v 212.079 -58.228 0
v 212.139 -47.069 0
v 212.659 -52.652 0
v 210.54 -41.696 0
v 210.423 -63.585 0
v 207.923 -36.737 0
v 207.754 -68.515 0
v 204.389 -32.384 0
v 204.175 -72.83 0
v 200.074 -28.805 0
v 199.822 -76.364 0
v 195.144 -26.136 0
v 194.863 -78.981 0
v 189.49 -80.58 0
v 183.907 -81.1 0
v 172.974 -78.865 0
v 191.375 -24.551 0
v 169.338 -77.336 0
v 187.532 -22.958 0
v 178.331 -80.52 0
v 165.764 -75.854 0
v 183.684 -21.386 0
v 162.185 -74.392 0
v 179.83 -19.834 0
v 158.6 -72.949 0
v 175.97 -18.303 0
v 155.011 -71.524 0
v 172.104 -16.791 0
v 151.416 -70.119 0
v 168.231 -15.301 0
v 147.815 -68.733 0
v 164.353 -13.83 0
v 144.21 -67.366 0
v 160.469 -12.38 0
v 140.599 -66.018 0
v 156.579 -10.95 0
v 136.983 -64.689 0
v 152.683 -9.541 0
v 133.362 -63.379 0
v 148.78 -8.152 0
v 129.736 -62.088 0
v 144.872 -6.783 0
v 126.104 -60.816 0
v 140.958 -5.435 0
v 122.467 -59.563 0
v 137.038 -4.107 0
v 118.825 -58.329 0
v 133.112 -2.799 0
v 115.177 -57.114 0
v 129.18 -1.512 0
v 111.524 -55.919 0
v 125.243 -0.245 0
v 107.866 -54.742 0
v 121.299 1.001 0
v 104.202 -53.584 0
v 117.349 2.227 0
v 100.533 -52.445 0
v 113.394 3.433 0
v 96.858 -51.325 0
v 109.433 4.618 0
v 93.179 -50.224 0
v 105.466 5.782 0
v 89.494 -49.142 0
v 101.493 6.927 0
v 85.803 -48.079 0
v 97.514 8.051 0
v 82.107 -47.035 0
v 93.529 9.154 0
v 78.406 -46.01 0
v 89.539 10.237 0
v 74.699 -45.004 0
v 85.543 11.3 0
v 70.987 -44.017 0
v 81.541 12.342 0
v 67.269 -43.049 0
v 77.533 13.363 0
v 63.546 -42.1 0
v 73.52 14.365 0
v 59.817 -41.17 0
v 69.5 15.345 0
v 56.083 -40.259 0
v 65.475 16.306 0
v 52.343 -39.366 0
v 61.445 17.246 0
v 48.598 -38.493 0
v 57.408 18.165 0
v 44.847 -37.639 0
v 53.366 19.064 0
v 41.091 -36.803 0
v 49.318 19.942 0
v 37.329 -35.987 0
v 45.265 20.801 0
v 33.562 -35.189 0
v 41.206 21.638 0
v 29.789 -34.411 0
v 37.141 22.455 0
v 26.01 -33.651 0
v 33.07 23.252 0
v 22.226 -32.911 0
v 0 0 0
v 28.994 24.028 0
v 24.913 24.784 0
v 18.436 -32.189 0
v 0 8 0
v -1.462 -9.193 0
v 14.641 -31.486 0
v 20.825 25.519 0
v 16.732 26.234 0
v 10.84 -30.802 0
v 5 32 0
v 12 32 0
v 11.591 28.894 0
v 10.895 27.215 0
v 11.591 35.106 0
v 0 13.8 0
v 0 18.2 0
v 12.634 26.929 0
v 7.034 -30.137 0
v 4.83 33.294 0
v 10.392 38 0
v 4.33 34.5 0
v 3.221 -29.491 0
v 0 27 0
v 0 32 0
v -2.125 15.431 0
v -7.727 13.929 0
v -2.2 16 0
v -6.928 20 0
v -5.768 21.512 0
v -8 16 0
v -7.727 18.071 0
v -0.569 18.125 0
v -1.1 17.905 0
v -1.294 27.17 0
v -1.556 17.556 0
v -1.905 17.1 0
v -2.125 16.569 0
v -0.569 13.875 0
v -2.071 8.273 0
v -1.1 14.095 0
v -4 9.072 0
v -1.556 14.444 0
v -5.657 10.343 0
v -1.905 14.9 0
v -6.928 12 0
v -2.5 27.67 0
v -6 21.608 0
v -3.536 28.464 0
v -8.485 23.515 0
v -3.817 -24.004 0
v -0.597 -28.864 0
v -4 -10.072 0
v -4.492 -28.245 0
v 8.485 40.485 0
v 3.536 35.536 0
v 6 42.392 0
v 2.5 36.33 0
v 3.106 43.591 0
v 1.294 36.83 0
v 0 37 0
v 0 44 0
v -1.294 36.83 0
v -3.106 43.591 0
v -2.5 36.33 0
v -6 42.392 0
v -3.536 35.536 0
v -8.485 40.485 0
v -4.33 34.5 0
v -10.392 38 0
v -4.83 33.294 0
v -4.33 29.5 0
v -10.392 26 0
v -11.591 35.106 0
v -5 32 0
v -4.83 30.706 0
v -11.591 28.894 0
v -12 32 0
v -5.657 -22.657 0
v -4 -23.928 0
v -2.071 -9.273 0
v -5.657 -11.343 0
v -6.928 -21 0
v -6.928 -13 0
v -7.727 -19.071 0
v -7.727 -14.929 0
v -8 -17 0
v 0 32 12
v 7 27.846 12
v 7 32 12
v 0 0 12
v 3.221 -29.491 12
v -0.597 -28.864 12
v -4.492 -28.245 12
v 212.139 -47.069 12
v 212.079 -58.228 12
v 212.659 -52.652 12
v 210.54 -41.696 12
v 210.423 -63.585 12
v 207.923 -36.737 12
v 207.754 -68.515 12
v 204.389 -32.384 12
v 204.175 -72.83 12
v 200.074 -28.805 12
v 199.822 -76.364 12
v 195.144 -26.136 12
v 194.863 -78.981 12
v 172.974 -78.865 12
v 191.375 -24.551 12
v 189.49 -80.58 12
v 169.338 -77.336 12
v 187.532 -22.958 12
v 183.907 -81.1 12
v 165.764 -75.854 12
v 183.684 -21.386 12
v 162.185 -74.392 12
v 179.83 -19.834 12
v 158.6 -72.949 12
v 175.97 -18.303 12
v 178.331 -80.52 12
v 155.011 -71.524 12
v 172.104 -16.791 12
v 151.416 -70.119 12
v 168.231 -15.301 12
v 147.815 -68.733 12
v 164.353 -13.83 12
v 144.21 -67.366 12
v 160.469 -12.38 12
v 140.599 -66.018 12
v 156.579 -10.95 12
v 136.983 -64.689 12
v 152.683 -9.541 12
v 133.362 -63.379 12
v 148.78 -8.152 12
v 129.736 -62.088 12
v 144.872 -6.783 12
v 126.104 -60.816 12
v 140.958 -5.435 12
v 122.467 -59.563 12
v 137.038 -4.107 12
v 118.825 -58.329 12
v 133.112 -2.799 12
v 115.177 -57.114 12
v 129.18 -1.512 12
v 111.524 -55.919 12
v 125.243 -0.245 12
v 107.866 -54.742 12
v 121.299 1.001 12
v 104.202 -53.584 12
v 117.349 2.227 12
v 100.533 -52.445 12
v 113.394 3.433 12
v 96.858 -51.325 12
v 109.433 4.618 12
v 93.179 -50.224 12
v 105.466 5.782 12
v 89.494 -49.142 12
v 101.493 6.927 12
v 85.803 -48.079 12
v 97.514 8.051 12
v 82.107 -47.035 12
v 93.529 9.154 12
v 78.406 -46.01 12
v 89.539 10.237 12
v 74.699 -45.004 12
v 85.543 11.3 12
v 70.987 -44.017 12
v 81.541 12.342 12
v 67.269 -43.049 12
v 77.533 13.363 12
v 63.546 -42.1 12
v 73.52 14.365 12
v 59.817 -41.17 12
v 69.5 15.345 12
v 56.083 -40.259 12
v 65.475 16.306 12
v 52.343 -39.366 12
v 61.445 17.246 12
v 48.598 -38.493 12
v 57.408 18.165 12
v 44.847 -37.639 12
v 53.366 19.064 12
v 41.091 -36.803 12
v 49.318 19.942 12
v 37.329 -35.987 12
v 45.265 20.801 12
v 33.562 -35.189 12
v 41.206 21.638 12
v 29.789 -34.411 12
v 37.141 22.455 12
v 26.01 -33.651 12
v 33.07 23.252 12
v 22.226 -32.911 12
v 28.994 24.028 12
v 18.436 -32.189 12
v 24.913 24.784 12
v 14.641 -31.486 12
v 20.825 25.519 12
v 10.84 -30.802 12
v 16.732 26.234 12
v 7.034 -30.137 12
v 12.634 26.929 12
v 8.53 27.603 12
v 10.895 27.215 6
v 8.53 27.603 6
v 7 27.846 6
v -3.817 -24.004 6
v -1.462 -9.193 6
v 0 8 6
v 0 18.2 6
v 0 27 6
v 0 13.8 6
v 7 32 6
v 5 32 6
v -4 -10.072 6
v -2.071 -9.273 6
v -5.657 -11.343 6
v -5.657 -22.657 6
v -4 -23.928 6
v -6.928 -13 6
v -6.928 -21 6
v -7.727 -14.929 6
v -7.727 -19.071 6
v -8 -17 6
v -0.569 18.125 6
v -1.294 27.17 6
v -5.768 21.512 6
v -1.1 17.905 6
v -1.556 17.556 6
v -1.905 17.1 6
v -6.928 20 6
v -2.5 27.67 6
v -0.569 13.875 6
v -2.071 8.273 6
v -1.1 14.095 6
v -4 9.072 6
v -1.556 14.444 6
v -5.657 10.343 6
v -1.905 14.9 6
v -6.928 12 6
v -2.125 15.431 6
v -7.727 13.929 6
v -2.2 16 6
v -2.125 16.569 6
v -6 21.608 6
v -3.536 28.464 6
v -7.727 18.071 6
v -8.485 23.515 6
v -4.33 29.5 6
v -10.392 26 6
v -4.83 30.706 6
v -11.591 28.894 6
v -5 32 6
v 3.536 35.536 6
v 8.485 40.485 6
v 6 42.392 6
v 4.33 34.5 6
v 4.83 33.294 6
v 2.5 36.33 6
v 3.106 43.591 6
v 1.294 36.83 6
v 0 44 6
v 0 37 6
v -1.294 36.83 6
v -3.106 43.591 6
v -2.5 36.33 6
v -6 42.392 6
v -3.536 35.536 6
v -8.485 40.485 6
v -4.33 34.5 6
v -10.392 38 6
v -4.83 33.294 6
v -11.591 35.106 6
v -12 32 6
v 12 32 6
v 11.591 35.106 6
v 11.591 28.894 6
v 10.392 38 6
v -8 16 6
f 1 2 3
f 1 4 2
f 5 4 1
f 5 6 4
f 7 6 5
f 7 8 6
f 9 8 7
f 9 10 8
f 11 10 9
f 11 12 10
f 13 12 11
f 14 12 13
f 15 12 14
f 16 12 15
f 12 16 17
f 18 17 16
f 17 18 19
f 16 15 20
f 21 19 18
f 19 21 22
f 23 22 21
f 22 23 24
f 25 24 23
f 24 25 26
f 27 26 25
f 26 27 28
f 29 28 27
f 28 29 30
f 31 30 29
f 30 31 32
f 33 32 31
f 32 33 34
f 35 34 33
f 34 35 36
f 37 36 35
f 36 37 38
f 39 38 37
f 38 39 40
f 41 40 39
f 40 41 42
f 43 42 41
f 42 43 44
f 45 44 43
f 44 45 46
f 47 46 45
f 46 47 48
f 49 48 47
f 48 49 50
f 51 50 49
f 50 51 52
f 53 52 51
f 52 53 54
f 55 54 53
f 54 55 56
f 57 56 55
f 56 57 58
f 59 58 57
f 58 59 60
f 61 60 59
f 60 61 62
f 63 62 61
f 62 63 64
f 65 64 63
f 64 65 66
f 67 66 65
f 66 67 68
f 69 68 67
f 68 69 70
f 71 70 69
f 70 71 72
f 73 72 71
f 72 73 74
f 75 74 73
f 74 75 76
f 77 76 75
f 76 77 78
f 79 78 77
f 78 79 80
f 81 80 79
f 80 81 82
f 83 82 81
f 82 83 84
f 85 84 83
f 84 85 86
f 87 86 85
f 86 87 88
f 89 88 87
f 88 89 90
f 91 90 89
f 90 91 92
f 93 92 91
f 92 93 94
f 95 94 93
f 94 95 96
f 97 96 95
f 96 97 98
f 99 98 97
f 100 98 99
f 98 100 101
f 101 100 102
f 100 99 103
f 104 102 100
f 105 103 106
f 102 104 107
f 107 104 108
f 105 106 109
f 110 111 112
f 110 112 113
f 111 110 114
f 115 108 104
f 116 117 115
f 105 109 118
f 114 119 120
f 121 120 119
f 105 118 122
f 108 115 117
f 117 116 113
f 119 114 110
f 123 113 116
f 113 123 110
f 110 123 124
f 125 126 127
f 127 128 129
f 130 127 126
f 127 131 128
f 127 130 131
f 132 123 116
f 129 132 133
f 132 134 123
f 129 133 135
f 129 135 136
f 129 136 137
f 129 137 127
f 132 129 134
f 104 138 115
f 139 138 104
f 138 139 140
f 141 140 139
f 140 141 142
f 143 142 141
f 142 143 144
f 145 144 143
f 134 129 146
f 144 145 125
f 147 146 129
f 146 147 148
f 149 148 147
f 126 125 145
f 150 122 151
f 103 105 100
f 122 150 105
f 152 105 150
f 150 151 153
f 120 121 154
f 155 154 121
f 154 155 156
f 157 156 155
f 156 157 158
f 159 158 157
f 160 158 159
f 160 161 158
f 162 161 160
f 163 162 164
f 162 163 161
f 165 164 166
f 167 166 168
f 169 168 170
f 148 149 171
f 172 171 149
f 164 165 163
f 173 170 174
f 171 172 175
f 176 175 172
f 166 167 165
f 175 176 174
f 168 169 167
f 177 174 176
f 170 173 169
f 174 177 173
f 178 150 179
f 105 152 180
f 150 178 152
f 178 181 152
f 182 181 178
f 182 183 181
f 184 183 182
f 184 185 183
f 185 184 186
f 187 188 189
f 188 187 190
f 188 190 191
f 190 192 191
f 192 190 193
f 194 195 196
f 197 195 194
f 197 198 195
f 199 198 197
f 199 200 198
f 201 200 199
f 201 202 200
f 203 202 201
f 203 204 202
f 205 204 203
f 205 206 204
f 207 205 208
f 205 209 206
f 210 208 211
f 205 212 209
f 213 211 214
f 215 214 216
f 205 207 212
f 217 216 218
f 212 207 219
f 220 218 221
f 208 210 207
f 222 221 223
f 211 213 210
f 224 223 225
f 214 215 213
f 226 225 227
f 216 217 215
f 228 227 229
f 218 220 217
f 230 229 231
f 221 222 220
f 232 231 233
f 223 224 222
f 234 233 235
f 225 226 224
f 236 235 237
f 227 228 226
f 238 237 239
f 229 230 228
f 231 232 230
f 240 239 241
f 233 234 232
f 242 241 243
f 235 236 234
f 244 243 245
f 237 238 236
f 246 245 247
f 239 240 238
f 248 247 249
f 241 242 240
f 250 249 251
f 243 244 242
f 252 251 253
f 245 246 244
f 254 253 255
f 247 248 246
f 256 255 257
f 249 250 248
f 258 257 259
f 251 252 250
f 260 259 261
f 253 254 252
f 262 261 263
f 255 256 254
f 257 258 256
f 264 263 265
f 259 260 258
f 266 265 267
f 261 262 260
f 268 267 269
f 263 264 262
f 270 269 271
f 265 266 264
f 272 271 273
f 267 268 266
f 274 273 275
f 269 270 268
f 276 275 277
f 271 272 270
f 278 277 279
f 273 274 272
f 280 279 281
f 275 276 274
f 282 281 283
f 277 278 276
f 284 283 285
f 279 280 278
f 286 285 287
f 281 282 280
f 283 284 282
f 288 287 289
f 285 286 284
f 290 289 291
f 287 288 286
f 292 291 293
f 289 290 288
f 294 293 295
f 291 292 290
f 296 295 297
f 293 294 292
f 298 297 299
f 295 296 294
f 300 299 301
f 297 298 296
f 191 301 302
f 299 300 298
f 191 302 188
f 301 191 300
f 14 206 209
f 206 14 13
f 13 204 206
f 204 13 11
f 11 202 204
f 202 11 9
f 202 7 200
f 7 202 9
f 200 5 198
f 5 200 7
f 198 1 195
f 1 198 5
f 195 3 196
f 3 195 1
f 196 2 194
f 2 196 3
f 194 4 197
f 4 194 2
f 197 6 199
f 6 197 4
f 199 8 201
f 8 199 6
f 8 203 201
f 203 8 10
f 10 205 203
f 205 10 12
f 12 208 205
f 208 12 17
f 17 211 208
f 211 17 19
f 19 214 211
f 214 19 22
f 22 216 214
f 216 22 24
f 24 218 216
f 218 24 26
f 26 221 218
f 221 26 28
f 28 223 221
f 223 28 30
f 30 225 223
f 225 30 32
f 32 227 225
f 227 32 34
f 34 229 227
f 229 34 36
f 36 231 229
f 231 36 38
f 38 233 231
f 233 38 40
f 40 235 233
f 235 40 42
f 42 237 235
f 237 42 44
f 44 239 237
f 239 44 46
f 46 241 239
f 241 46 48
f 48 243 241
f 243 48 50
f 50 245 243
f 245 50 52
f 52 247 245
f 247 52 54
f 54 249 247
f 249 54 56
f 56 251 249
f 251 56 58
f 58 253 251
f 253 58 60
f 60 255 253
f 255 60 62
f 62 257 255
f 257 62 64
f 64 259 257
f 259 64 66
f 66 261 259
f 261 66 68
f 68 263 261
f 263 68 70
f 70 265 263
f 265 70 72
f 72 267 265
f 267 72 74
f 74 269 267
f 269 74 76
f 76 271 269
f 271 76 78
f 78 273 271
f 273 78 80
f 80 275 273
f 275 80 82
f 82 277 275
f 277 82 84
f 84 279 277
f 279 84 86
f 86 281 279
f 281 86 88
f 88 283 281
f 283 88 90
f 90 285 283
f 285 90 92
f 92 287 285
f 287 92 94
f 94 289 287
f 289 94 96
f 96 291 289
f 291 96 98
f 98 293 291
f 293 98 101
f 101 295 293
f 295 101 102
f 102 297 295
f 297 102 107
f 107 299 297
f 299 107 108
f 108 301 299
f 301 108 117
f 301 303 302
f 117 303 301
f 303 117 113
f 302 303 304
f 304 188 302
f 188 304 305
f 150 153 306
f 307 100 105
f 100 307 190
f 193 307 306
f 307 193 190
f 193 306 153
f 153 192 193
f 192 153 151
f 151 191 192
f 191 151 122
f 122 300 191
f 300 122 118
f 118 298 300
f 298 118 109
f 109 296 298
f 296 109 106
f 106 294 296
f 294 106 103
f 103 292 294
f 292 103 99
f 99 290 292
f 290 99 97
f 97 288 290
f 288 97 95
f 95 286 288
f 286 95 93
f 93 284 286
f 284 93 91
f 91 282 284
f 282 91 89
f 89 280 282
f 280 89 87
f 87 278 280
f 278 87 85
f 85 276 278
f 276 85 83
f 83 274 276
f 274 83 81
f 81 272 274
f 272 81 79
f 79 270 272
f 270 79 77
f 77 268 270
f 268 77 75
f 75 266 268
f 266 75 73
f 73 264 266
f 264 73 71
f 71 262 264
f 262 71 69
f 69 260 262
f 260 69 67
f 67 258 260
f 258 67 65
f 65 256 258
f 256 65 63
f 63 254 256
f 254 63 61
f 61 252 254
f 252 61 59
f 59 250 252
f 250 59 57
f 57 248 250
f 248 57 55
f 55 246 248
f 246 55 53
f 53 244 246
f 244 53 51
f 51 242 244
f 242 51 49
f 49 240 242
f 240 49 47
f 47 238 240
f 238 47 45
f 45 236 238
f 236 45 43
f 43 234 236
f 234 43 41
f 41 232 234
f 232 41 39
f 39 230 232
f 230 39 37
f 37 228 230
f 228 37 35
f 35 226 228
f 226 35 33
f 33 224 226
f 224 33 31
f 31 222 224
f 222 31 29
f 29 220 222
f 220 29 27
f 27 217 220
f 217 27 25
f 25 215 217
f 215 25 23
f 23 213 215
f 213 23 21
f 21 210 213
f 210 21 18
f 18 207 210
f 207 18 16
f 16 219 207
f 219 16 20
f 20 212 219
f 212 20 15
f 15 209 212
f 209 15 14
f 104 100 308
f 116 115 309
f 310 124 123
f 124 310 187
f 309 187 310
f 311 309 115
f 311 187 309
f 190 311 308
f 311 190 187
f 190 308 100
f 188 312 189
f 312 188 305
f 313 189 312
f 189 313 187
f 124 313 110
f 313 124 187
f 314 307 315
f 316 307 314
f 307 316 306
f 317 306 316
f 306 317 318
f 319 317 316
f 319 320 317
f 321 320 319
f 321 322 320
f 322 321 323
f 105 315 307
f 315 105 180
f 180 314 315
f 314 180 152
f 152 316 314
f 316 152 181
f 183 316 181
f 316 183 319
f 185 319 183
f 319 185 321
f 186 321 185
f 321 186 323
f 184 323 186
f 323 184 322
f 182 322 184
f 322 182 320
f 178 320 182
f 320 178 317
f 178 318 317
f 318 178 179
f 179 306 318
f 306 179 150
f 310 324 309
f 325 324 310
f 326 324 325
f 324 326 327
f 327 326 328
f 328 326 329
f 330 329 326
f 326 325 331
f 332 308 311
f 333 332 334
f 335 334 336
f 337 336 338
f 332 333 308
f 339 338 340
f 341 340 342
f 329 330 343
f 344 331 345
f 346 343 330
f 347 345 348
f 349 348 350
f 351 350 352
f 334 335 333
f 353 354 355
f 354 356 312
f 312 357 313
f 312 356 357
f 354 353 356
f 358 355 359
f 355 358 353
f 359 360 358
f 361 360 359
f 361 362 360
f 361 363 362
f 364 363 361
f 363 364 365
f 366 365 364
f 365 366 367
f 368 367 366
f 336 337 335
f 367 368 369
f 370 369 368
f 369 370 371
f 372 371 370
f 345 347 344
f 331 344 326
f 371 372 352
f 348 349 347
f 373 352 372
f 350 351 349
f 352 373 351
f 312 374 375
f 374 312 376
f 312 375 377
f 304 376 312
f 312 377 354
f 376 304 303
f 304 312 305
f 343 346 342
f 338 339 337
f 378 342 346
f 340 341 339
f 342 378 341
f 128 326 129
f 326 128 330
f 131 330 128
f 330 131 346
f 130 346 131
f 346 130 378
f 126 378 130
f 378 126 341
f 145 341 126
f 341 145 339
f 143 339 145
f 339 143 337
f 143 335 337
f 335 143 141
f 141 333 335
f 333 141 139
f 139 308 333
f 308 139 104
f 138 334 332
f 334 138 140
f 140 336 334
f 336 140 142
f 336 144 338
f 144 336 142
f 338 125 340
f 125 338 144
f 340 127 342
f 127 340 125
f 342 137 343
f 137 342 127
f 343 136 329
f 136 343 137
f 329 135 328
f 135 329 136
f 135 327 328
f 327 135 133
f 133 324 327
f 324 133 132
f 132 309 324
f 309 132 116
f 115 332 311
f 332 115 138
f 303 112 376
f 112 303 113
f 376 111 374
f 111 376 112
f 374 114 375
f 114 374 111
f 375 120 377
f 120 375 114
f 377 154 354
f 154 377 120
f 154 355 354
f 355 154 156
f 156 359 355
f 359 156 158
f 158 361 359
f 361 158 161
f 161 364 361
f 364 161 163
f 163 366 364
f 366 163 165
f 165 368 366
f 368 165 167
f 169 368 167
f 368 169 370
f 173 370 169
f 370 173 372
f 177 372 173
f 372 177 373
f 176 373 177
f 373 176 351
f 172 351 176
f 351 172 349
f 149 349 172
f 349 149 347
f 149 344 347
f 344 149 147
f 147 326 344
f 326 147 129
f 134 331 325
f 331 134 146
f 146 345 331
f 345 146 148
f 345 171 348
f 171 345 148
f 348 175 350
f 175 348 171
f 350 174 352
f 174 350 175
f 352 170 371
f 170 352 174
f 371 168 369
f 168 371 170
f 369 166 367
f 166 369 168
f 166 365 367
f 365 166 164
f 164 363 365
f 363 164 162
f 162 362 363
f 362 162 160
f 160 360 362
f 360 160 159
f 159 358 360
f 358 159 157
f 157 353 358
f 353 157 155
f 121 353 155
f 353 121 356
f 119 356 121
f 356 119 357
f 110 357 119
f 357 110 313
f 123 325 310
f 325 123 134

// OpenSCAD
// hanger-split: half w22 w=22 cm slope=15.92 deg bow=0.59 cm r=2.86 cm depth=12.0 mm
// Print this half twice, flat. Turn the second half 180 degrees about the vertical axis, lay the
// bosses together and clamp with two M4 bolts through the 4.4 mm holes.
// Generated by hanger_split.split.scad; not rendered in this run (no OpenSCAD in the image).
depth = 12.0;
union() {
  linear_extrude(height = 12) polygon([[4.492, 28.245], [8.530, 27.603], [12.634, 26.929], [16.732, 26.234], [20.825, 25.519], [24.913, 24.784], [28.994, 24.028], [33.070, 23.252], [37.141, 22.455], [41.206, 21.638], [45.265, 20.801], [49.318, 19.942], [53.366, 19.064], [57.408, 18.165], [61.445, 17.246], [65.475, 16.306], [69.500, 15.345], [73.520, 14.365], [77.533, 13.363], [81.541, 12.342], [85.543, 11.300], [89.539, 10.237], [93.529, 9.154], [97.514, 8.051], [101.493, 6.927], [105.466, 5.782], [109.433, 4.618], [113.394, 3.433], [117.349, 2.227], [121.299, 1.001], [125.243, -0.245], [129.180, -1.512], [133.112, -2.799], [137.038, -4.107], [140.958, -5.435], [144.872, -6.783], [148.780, -8.152], [152.683, -9.541], [156.579, -10.950], [160.469, -12.380], [164.353, -13.830], [168.231, -15.301], [172.104, -16.791], [175.970, -18.303], [179.830, -19.834], [183.684, -21.386], [187.532, -22.958], [191.375, -24.551], [195.144, -26.136], [200.074, -28.805], [204.389, -32.384], [207.923, -36.737], [210.540, -41.696], [212.139, -47.069], [212.659, -52.652], [212.079, -58.228], [210.423, -63.585], [207.754, -68.515], [204.175, -72.830], [199.822, -76.364], [194.863, -78.981], [189.490, -80.580], [183.907, -81.100], [178.331, -80.520], [172.974, -78.865], [169.338, -77.336], [165.764, -75.854], [162.185, -74.392], [158.600, -72.949], [155.011, -71.524], [151.416, -70.119], [147.815, -68.733], [144.210, -67.366], [140.599, -66.018], [136.983, -64.689], [133.362, -63.379], [129.736, -62.088], [126.104, -60.816], [122.467, -59.563], [118.825, -58.329], [115.177, -57.114], [111.524, -55.919], [107.866, -54.742], [104.202, -53.584], [100.533, -52.445], [96.858, -51.325], [93.179, -50.224], [89.494, -49.142], [85.803, -48.079], [82.107, -47.035], [78.406, -46.010], [74.699, -45.004], [70.987, -44.017], [67.269, -43.049], [63.546, -42.100], [59.817, -41.170], [56.083, -40.259], [52.343, -39.366], [48.598, -38.493], [44.847, -37.639], [41.091, -36.803], [37.329, -35.987], [33.562, -35.189], [29.789, -34.411], [26.010, -33.651], [22.226, -32.911], [18.436, -32.189], [14.641, -31.486], [10.840, -30.802], [7.034, -30.137], [3.221, -29.491], [-0.597, -28.864], [-4.492, -28.245]]);
  linear_extrude(height = 12) polygon([[0.000, -28.600], [7.402, -27.625], [14.300, -24.768], [20.223, -20.223], [24.768, -14.300], [27.625, -7.402], [28.600, -0.000], [27.625, 7.402], [24.768, 14.300], [20.223, 20.223], [14.300, 24.768], [7.402, 27.625], [0.000, 28.600]]);
  linear_extrude(height = 12) polygon([[0.000, 0.000], [7.000, 0.000], [7.000, 32.000], [0.000, 32.000]]);
  linear_extrude(height = 6) difference() { polygon([[8.000, -17.000], [7.727, -14.929], [6.928, -13.000], [5.657, -11.343], [4.000, -10.072], [2.071, -9.273], [0.000, -9.000], [-2.071, -9.273], [-4.000, -10.072], [-5.657, -11.343], [-6.928, -13.000], [-7.727, -14.929], [-8.000, -17.000], [-7.727, -19.071], [-6.928, -21.000], [-5.657, -22.657], [-4.000, -23.928], [-2.071, -24.727], [-0.000, -25.000], [2.071, -24.727], [4.000, -23.928], [5.657, -22.657], [6.928, -21.000], [7.727, -19.071]]); polygon([[2.200, -17.000], [2.125, -16.431], [1.905, -15.900], [1.556, -15.444], [1.100, -15.095], [0.569, -14.875], [0.000, -14.800], [-0.569, -14.875], [-1.100, -15.095], [-1.556, -15.444], [-1.905, -15.900], [-2.125, -16.431], [-2.200, -17.000], [-2.125, -17.569], [-1.905, -18.100], [-1.556, -18.556], [-1.100, -18.905], [-0.569, -19.125], [-0.000, -19.200], [0.569, -19.125], [1.100, -18.905], [1.556, -18.556], [1.905, -18.100], [2.125, -17.569]]); }
  linear_extrude(height = 6) difference() { polygon([[8.000, 16.000], [7.727, 18.071], [6.928, 20.000], [5.657, 21.657], [4.000, 22.928], [2.071, 23.727], [0.000, 24.000], [-2.071, 23.727], [-4.000, 22.928], [-5.657, 21.657], [-6.928, 20.000], [-7.727, 18.071], [-8.000, 16.000], [-7.727, 13.929], [-6.928, 12.000], [-5.657, 10.343], [-4.000, 9.072], [-2.071, 8.273], [-0.000, 8.000], [2.071, 8.273], [4.000, 9.072], [5.657, 10.343], [6.928, 12.000], [7.727, 13.929]]); polygon([[2.200, 16.000], [2.125, 16.569], [1.905, 17.100], [1.556, 17.556], [1.100, 17.905], [0.569, 18.125], [0.000, 18.200], [-0.569, 18.125], [-1.100, 17.905], [-1.556, 17.556], [-1.905, 17.100], [-2.125, 16.569], [-2.200, 16.000], [-2.125, 15.431], [-1.905, 14.900], [-1.556, 14.444], [-1.100, 14.095], [-0.569, 13.875], [-0.000, 13.800], [0.569, 13.875], [1.100, 14.095], [1.556, 14.444], [1.905, 14.900], [2.125, 15.431]]); }
  linear_extrude(height = 6) difference() { polygon([[12.000, 32.000], [11.591, 35.106], [10.392, 38.000], [8.485, 40.485], [6.000, 42.392], [3.106, 43.591], [0.000, 44.000], [-3.106, 43.591], [-6.000, 42.392], [-8.485, 40.485], [-10.392, 38.000], [-11.591, 35.106], [-12.000, 32.000], [-11.591, 28.894], [-10.392, 26.000], [-8.485, 23.515], [-6.000, 21.608], [-3.106, 20.409], [-0.000, 20.000], [3.106, 20.409], [6.000, 21.608], [8.485, 23.515], [10.392, 26.000], [11.591, 28.894]]); polygon([[5.000, 32.000], [4.830, 33.294], [4.330, 34.500], [3.536, 35.536], [2.500, 36.330], [1.294, 36.830], [0.000, 37.000], [-1.294, 36.830], [-2.500, 36.330], [-3.536, 35.536], [-4.330, 34.500], [-4.830, 33.294], [-5.000, 32.000], [-4.830, 30.706], [-4.330, 29.500], [-3.536, 28.464], [-2.500, 27.670], [-1.294, 27.170], [-0.000, 27.000], [1.294, 27.170], [2.500, 27.670], [3.536, 28.464], [4.330, 29.500], [4.830, 30.706]]); }
}
